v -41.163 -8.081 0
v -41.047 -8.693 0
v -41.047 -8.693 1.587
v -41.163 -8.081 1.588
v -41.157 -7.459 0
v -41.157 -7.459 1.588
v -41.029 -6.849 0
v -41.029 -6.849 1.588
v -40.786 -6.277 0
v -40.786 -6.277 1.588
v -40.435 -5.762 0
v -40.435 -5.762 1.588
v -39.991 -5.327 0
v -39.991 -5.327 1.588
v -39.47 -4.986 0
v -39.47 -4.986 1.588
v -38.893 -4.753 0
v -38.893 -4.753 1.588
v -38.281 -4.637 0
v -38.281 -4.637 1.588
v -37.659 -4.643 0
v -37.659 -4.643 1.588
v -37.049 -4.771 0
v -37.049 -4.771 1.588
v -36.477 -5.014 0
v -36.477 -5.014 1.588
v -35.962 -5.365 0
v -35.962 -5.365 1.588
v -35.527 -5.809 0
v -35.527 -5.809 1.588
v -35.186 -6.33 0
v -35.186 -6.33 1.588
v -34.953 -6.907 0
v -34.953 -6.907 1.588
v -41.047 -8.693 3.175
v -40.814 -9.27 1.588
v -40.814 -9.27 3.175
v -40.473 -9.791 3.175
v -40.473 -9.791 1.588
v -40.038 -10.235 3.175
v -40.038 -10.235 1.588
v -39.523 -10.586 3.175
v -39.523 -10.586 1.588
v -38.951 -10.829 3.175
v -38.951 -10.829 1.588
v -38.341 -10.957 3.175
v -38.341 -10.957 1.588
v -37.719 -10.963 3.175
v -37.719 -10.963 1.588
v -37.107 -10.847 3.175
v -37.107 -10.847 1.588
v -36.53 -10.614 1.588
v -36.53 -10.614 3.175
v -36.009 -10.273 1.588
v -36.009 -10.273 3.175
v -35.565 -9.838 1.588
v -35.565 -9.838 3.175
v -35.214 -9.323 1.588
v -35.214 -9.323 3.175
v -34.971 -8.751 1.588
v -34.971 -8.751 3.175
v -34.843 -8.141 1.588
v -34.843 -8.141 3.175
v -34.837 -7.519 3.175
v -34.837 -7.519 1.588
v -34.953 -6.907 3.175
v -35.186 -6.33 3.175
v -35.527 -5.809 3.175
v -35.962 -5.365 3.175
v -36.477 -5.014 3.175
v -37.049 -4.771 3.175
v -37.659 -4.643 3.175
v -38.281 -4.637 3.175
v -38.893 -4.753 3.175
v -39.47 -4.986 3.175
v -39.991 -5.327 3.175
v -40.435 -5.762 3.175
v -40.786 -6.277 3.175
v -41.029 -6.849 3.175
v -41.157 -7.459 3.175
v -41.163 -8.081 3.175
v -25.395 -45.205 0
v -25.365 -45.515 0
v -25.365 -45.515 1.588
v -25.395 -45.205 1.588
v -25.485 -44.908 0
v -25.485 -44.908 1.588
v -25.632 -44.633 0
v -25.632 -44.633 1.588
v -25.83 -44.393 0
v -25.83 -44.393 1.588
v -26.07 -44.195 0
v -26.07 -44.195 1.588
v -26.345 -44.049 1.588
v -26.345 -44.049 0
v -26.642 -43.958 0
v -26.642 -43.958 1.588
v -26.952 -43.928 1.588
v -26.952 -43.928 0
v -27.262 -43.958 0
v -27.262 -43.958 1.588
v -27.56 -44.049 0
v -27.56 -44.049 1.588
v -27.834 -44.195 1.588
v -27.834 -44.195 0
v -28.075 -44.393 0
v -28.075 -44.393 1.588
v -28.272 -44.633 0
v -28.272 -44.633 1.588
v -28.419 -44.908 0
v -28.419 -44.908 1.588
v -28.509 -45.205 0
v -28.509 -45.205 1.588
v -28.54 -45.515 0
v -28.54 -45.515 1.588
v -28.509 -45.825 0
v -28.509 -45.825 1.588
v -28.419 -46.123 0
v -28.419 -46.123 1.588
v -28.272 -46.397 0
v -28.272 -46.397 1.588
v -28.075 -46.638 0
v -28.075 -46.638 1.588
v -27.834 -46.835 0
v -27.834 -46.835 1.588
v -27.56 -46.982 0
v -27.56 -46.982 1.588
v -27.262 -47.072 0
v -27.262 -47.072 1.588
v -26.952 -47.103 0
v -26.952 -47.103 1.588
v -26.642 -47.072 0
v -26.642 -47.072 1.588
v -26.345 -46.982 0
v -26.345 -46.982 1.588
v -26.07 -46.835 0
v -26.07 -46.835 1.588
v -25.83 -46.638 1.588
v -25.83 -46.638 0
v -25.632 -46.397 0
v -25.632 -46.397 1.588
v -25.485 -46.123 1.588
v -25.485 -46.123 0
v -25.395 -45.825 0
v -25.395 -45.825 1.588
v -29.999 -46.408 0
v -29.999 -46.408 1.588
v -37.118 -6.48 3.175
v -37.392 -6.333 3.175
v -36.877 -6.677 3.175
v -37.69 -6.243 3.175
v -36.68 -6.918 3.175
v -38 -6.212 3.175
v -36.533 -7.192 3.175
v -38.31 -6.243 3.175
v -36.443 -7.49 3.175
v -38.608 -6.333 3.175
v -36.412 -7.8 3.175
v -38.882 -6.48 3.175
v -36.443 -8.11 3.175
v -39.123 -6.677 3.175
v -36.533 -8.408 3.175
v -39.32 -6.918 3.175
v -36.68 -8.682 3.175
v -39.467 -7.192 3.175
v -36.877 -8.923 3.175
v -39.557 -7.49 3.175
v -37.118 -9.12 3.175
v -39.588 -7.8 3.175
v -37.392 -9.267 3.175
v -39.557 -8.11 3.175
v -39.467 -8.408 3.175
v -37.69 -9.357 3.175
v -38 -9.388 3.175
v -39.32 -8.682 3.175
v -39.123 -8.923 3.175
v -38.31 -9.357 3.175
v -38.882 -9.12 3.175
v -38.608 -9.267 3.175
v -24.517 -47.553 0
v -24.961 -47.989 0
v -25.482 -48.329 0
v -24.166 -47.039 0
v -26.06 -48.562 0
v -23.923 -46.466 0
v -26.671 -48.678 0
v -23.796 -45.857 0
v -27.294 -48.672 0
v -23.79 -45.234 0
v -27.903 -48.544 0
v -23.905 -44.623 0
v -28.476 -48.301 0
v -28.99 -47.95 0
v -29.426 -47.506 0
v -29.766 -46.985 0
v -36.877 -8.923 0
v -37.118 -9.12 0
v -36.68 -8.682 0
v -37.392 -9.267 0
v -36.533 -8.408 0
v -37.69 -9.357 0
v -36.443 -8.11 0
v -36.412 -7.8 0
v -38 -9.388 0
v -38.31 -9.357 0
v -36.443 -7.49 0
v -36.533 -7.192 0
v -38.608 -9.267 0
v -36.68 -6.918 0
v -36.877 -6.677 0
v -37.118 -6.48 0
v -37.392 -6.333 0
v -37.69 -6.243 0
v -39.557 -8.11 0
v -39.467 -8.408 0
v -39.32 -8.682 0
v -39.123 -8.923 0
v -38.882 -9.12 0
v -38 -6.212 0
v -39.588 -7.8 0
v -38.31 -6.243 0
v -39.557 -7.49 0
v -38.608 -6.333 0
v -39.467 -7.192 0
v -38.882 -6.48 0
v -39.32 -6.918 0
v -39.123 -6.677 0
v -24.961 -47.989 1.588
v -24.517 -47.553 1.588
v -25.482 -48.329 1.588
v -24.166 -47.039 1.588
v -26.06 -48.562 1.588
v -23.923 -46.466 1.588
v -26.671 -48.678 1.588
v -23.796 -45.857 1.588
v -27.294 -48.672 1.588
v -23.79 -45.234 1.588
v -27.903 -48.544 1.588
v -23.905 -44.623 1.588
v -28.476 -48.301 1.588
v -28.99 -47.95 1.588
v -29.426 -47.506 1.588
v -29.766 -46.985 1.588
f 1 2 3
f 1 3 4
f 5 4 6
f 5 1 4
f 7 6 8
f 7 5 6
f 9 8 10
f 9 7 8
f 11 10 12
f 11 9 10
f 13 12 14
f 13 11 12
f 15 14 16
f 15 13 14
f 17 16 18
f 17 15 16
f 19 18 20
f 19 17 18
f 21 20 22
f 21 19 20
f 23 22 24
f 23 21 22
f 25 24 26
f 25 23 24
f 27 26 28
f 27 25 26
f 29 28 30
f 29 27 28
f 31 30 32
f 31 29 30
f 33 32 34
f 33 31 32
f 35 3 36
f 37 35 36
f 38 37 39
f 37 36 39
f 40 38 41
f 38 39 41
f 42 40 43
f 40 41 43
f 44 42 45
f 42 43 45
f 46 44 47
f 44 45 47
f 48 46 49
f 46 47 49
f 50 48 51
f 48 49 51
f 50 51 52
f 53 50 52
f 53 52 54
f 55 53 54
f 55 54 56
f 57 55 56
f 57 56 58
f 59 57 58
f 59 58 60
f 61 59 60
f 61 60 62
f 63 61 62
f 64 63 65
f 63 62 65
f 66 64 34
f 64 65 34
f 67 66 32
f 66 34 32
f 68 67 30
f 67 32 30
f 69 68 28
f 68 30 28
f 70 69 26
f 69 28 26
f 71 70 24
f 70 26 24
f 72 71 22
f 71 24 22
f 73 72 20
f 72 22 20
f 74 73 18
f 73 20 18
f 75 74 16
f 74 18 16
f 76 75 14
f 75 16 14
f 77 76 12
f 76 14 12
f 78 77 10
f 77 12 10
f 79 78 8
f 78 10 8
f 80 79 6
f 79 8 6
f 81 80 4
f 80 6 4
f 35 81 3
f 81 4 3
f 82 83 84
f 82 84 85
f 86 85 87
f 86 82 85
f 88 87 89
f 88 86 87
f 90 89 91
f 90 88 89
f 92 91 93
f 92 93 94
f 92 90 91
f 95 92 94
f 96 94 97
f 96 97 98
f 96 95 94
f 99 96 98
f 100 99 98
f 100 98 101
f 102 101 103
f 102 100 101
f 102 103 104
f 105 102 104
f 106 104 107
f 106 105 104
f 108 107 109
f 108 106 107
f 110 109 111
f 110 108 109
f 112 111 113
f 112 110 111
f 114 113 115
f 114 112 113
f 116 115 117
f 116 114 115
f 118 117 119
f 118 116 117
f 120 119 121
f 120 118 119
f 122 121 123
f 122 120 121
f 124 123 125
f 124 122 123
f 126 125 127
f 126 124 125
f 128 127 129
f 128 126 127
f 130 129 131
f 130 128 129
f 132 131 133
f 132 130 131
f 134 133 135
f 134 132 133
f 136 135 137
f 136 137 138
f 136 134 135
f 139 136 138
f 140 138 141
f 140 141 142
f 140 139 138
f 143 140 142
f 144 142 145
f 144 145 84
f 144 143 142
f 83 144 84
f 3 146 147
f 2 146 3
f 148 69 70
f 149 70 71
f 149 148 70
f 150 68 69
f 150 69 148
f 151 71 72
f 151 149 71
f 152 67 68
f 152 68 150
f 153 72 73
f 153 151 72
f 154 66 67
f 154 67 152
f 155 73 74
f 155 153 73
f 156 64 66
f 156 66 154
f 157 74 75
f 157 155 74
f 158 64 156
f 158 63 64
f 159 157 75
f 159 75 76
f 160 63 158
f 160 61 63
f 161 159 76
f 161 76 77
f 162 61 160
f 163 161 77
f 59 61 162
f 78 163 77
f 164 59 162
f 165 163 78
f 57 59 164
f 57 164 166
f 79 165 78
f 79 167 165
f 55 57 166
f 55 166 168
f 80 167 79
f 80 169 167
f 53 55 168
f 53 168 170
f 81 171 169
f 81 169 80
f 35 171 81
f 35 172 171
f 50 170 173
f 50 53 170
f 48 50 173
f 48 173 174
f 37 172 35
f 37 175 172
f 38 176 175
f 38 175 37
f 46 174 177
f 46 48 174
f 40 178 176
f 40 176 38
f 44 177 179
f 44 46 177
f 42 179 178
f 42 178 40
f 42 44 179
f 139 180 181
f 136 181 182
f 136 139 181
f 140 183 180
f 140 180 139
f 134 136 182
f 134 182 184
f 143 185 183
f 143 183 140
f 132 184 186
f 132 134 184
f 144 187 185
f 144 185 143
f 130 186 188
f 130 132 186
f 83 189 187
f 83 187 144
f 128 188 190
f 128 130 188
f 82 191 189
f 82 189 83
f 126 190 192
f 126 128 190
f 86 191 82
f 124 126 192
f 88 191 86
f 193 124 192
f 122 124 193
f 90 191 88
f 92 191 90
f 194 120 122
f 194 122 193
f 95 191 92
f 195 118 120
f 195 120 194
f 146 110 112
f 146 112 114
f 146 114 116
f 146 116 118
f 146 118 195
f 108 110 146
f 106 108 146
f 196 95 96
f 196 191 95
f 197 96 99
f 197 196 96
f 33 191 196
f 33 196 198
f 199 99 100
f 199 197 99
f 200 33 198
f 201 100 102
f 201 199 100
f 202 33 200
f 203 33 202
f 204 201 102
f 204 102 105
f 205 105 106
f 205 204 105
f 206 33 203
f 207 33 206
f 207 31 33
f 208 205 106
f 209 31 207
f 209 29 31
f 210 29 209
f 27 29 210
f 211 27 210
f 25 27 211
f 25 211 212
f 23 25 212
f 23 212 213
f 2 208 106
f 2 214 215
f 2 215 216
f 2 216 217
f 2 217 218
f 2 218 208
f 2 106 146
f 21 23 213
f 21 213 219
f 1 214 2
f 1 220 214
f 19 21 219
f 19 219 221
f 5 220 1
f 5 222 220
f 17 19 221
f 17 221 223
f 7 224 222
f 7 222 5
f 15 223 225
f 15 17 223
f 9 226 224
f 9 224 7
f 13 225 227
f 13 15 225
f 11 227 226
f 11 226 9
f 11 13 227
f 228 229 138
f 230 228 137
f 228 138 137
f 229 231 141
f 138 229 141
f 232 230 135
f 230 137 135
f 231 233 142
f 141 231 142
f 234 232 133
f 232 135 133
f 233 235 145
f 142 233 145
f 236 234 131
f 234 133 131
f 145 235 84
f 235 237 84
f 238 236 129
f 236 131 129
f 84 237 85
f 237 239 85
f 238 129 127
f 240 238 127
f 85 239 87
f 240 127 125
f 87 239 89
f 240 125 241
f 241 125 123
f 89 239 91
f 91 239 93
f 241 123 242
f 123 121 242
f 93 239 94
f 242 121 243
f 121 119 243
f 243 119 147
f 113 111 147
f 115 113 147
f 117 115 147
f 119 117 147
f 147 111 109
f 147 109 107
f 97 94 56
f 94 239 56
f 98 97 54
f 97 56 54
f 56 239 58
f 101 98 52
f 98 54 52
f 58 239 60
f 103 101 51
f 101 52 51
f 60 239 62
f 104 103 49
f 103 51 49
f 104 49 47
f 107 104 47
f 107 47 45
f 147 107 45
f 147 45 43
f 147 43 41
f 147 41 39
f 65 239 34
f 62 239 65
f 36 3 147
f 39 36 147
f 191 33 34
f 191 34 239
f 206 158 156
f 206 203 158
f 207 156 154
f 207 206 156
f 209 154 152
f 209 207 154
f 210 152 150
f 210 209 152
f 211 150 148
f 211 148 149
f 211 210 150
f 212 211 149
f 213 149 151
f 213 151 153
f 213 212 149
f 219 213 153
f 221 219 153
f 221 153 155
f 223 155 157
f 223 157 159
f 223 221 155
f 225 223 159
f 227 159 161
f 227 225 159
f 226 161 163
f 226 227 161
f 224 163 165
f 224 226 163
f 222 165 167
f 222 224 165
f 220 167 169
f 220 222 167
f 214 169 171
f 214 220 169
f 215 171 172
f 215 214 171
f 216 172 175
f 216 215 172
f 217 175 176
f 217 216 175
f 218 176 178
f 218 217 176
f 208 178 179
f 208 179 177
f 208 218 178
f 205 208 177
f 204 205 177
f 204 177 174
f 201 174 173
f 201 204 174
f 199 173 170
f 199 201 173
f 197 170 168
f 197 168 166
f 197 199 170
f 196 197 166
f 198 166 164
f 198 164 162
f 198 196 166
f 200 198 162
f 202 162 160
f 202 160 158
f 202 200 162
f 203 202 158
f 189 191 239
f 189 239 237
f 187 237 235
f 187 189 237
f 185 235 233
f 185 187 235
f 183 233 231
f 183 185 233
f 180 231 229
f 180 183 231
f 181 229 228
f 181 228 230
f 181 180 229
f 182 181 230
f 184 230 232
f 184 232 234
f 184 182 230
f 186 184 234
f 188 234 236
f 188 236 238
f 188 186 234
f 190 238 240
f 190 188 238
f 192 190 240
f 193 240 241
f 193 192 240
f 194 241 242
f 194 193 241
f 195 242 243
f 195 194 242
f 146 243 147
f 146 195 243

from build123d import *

# Parameters (mm, degrees)
SKETCH1_R           = 1.5875
BOSS_EXTRUDE1_DEPTH = 1.5875
SKETCH2_R           = 3.175
SKETCH2_R_2         = 1.5875
BOSS_EXTRUDE2_DEPTH = 1.5875


with BuildPart() as part:
    # Sketch1 → Boss-Extrude1 (new body)
    with BuildSketch(Plane.XY):
        with BuildLine():
            Line((-34.953036507, -6.90745394), (-23.905143538, -44.62262411))
            ThreePointArc((-23.905143538, -44.62262411), (-26.059560971, -48.562133663), (-29.999070525, -46.407716231))
            Line((-29.999070525, -46.407716231), (-41.046963493, -8.69254606))
            ThreePointArc((-41.046963493, -8.69254606), (-38.89254606, -4.753036507), (-34.953036507, -6.90745394))
        make_face()
        with Locations((-26.952107032, -45.51517017)):
            Circle(SKETCH1_R, mode=Mode.SUBTRACT)
        with Locations((-38, -7.8)):
            Circle(SKETCH1_R, mode=Mode.SUBTRACT)
    extrude(amount=BOSS_EXTRUDE1_DEPTH)

    # Sketch2 → Boss-Extrude2 (add)
    with BuildSketch(Plane.XY.offset(1.5875)):
        with Locations(Location((-38, -7.8, 0), (0, 0, 196.32687427))):
            Circle(SKETCH2_R)
        with Locations((-38, -7.8)):
            Circle(SKETCH2_R_2, mode=Mode.SUBTRACT)
    extrude(amount=BOSS_EXTRUDE2_DEPTH)


solid = part.part
